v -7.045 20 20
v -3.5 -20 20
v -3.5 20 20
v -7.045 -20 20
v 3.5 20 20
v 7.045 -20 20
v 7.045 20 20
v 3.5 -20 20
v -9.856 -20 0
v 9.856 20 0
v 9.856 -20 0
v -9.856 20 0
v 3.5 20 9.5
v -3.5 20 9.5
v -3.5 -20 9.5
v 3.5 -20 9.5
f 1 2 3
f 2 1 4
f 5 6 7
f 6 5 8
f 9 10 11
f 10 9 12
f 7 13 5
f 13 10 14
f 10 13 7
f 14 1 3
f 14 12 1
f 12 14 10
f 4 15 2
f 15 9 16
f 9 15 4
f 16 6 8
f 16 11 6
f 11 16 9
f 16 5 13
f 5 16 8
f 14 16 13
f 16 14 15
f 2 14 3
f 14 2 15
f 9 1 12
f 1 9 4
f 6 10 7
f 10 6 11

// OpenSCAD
// Straight piece for supporting the middle of cage wall

difference() {
    translate([0,0,10]) cube( [20,40,20], center=true );    
    translate([0,0,15]) cube( [ 7,41,11], center=true );
    translate([-13.5,0,10]) rotate([0,8,0]) cube( [10,41,30], center=true );
    translate([13.5,0,10]) rotate([0,-8,0]) cube( [10,41,30], center=true );
}
